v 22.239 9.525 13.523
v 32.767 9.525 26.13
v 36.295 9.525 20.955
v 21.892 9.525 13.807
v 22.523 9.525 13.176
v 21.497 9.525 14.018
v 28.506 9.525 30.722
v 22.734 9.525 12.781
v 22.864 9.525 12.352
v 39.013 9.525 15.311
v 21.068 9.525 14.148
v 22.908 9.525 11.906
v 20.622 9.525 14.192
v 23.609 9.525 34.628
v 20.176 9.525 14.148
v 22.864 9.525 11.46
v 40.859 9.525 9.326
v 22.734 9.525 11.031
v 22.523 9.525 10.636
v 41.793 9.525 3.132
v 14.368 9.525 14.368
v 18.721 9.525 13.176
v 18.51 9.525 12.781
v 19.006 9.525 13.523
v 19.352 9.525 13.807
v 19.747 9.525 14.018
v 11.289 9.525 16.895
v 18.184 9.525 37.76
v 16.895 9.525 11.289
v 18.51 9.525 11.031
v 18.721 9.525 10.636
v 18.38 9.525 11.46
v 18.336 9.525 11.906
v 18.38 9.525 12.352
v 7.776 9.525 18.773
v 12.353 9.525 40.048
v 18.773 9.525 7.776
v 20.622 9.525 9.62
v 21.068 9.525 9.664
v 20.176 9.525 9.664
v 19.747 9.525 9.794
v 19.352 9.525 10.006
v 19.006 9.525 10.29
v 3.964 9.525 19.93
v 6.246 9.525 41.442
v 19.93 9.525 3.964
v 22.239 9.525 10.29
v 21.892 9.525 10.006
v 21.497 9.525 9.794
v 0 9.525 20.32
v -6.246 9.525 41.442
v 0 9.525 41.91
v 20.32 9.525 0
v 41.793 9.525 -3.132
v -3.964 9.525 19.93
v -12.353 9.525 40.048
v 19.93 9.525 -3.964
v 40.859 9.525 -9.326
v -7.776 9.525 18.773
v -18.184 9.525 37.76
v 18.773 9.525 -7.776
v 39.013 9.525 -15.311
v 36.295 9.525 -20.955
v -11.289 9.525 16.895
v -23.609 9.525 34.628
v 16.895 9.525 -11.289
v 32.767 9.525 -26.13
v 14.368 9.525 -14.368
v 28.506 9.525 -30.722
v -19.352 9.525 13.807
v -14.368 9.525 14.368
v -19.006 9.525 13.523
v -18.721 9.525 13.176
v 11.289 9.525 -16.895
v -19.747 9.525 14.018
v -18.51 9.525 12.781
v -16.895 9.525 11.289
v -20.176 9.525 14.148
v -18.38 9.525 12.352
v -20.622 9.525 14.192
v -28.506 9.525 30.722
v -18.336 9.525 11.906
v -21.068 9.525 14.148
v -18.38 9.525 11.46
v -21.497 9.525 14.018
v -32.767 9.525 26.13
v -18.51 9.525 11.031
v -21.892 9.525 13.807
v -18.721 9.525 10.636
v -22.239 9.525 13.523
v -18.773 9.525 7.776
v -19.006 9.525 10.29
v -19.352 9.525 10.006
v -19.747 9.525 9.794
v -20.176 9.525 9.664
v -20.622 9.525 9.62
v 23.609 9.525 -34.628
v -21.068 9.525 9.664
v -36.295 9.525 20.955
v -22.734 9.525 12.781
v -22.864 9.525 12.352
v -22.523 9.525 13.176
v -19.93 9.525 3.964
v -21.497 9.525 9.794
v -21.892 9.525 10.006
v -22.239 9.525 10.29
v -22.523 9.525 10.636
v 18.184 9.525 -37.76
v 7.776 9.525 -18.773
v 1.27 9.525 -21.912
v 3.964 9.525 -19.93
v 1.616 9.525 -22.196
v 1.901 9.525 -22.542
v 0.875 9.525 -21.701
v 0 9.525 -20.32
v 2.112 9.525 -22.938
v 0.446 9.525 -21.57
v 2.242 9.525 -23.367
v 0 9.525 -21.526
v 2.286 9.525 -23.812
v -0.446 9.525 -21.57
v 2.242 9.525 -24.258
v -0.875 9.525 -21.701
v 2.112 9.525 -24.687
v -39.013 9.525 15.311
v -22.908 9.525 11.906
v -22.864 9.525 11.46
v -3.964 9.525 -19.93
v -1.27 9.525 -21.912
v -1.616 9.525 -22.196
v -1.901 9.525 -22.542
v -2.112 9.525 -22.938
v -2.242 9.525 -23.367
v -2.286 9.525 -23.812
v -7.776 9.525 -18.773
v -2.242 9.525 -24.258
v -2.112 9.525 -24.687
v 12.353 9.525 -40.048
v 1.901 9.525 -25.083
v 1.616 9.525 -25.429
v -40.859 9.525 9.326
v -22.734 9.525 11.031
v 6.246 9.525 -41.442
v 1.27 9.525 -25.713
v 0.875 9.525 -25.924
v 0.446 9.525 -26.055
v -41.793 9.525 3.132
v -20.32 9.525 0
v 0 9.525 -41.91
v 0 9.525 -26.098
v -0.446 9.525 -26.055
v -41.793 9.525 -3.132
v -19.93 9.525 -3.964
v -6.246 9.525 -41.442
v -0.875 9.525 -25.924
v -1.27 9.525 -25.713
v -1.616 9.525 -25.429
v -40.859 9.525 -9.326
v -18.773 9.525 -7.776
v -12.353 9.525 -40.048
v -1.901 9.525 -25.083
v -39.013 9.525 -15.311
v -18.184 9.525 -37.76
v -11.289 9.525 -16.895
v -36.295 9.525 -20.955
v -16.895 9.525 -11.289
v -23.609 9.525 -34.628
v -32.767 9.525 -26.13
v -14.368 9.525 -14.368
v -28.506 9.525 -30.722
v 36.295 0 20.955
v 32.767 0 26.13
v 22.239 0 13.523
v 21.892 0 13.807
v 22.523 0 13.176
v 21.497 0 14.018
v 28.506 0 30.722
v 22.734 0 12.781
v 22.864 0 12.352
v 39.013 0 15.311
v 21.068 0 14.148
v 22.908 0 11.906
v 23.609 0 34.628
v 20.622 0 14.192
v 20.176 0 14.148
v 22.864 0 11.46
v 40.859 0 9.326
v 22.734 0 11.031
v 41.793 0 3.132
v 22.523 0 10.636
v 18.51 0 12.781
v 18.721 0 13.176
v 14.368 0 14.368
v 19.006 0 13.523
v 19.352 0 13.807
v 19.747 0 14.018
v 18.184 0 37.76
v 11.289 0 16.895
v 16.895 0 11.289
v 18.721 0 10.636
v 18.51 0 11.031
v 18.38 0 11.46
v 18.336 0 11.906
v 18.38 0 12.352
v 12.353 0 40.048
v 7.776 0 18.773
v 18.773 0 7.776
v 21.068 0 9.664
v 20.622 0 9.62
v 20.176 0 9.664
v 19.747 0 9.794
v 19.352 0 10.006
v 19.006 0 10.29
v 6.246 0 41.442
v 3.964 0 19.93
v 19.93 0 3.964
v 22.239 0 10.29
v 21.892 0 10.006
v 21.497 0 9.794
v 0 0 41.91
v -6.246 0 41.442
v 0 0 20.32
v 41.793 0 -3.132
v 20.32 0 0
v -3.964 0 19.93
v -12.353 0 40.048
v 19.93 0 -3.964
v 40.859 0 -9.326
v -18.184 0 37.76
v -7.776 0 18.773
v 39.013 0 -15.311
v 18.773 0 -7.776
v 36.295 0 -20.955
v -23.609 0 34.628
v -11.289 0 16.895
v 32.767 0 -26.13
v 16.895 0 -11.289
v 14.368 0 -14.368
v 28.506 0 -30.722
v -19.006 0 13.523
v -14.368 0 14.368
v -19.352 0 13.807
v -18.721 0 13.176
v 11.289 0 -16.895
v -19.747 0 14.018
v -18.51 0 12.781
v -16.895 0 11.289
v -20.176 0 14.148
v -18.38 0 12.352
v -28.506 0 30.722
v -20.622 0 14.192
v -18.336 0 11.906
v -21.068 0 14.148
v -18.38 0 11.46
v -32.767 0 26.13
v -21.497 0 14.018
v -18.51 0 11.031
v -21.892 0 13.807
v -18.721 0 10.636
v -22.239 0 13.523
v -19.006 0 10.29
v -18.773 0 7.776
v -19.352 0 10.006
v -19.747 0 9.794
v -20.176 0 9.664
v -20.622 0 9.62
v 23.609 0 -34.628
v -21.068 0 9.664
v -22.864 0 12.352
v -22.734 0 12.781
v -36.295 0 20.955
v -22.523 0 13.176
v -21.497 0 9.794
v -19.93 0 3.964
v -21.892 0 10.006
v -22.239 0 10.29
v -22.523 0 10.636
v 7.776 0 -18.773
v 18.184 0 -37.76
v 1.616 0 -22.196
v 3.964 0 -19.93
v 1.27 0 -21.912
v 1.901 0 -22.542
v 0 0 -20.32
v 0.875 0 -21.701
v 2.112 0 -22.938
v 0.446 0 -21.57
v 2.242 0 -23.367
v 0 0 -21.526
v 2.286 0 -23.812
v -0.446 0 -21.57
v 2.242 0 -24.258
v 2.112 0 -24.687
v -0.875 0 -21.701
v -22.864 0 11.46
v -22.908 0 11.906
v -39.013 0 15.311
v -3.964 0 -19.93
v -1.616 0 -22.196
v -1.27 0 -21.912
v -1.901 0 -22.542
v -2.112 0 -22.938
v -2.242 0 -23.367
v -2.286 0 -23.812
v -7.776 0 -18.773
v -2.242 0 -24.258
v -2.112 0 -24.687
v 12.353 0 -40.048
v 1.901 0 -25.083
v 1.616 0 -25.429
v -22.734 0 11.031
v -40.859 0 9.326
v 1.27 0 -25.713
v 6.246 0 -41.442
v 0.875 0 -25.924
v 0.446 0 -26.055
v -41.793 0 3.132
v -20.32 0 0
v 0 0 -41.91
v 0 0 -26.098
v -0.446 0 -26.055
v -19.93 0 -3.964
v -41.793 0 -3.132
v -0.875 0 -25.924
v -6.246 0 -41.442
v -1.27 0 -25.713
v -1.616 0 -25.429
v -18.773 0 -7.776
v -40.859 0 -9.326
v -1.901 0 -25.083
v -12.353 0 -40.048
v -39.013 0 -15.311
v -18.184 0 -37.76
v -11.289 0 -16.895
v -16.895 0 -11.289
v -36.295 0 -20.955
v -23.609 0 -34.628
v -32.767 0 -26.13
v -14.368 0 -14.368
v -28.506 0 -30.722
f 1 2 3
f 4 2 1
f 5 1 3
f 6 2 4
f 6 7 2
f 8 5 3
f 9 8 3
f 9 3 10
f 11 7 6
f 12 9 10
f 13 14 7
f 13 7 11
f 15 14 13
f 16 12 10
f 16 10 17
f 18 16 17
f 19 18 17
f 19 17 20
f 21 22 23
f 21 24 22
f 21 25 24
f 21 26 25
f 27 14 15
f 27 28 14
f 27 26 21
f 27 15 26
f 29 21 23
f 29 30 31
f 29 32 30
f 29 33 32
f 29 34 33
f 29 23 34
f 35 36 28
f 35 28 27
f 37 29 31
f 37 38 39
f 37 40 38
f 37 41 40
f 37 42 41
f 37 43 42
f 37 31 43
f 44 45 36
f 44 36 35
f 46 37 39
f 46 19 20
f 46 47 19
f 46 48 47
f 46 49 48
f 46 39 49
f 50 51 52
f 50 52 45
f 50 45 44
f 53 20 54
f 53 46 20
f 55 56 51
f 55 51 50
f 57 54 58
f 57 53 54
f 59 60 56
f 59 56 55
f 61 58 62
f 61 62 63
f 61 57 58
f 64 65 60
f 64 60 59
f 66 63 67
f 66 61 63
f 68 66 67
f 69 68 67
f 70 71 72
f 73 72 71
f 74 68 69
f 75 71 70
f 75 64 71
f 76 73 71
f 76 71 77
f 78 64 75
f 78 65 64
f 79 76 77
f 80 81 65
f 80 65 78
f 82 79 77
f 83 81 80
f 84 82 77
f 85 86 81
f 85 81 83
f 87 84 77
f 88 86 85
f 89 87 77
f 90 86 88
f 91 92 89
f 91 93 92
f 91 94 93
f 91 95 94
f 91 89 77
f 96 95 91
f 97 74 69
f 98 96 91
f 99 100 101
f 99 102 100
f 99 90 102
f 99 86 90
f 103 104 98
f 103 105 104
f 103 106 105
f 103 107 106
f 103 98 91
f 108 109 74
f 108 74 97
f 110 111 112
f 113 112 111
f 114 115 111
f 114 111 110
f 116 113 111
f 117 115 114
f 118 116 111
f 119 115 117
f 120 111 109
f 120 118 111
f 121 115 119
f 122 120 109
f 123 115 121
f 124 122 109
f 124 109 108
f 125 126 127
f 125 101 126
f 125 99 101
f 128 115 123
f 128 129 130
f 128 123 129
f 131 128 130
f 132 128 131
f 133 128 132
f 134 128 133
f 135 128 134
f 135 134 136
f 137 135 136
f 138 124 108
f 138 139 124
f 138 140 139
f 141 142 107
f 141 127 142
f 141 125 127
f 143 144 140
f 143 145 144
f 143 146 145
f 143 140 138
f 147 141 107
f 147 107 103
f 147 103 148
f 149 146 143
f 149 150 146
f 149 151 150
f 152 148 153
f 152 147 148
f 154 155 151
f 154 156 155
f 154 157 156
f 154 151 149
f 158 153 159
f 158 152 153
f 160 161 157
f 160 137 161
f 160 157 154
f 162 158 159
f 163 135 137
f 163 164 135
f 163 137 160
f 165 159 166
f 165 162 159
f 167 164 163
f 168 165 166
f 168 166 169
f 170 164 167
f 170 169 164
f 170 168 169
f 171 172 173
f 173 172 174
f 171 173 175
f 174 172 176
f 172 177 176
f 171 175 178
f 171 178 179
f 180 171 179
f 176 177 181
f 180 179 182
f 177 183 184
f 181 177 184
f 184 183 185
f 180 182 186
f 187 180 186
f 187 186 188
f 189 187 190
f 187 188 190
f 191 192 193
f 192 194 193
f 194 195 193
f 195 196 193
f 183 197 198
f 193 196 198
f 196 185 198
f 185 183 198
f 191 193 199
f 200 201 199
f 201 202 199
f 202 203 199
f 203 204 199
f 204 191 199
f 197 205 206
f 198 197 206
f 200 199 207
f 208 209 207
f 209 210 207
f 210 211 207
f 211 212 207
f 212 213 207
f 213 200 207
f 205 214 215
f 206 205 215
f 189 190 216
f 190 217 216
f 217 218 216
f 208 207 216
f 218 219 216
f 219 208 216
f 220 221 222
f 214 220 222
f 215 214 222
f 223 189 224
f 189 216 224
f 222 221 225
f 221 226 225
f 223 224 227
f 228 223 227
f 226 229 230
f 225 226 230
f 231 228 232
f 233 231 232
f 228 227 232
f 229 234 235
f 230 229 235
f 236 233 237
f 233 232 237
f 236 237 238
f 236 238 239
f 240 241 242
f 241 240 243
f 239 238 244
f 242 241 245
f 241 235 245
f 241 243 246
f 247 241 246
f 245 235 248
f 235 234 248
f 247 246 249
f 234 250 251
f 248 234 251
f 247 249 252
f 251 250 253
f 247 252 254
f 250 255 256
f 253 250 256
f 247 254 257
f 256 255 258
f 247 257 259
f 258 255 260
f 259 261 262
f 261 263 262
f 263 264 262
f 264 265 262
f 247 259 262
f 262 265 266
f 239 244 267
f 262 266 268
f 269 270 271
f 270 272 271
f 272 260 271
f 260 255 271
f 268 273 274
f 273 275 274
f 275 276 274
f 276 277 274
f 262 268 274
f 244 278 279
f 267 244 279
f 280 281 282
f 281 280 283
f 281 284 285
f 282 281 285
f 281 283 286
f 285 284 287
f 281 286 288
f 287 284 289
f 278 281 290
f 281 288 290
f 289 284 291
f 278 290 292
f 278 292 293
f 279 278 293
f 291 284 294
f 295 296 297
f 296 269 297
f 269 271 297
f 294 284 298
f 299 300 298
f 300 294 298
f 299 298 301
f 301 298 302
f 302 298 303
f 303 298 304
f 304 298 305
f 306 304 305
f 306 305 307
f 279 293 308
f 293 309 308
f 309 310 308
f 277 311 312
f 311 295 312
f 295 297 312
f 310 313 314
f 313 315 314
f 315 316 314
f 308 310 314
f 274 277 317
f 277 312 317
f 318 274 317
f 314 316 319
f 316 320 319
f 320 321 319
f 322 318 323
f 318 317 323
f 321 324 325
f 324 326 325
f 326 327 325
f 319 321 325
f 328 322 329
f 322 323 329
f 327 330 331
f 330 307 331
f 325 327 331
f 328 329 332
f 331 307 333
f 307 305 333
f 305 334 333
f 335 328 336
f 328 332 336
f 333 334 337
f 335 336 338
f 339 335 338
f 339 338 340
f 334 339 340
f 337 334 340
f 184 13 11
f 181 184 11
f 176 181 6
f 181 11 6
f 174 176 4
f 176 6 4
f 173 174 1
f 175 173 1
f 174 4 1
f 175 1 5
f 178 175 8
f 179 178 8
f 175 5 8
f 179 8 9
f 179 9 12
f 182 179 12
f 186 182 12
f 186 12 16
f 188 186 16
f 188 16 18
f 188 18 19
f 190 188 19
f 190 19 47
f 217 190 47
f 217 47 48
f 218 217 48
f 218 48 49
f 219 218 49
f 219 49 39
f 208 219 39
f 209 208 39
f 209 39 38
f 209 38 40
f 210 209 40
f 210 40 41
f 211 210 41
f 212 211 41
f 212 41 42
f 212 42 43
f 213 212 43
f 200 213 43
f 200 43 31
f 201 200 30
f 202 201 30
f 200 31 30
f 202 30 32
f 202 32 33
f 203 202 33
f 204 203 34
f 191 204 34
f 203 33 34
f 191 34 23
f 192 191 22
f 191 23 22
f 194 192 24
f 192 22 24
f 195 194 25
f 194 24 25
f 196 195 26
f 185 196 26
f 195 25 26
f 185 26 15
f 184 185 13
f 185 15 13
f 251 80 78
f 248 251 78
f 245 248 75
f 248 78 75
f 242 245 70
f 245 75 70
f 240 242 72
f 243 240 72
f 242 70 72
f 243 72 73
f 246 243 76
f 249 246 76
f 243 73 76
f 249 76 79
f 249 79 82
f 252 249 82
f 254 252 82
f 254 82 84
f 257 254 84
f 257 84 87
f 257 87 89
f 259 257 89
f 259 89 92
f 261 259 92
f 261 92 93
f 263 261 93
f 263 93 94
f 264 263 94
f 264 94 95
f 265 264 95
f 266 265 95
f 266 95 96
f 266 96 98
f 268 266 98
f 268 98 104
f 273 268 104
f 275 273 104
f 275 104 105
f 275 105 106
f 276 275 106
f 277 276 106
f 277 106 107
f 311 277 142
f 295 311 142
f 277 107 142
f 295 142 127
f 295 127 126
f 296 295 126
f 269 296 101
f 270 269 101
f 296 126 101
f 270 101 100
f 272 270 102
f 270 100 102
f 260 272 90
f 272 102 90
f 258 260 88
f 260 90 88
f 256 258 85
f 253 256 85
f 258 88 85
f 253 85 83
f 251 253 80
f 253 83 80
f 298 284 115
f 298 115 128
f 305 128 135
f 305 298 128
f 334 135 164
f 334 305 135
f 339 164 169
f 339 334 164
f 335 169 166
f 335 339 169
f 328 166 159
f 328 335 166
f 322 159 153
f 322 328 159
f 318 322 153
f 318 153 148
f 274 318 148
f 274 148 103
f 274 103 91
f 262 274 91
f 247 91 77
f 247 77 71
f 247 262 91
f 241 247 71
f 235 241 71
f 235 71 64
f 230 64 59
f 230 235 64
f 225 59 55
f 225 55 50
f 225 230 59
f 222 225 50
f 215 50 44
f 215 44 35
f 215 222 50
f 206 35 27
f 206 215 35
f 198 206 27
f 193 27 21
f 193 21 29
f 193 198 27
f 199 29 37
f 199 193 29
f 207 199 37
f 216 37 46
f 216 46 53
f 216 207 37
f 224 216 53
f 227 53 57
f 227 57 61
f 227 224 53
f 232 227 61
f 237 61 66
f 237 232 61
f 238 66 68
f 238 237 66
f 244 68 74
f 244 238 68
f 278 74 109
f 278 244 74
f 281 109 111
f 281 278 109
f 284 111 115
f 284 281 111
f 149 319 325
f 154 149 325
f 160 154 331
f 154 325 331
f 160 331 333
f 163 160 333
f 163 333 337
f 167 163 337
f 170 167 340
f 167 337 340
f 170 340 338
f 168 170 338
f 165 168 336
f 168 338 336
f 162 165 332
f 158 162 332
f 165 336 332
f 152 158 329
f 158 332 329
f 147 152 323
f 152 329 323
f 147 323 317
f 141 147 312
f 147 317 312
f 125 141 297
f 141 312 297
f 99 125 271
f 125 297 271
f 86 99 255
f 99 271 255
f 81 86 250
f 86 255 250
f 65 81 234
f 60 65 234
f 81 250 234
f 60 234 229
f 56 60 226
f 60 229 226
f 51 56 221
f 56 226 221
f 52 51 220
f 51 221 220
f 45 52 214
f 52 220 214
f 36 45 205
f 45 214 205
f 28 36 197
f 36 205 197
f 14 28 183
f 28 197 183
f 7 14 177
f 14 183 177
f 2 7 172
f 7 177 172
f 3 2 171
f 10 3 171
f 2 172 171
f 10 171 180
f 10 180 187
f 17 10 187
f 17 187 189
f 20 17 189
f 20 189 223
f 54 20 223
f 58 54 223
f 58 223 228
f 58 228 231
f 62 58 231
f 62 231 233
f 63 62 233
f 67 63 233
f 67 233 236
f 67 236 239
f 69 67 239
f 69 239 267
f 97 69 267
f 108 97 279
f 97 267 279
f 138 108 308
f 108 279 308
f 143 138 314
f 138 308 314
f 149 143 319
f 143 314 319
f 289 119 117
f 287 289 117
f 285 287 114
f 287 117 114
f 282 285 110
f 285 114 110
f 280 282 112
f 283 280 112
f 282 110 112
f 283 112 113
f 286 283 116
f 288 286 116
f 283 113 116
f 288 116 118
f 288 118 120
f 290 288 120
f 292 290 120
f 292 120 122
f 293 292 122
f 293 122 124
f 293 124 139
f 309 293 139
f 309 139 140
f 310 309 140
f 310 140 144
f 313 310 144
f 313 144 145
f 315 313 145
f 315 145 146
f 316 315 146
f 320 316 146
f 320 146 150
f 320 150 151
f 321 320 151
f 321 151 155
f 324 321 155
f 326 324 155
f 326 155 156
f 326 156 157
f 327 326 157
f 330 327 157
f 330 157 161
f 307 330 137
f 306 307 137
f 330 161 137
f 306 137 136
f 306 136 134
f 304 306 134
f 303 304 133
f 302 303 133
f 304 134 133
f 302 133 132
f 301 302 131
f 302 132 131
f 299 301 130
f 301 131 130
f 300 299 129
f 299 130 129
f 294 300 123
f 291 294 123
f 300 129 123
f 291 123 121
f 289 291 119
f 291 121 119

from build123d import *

# Parameters (mm, degrees)
SKETCH1_R           = 41.91
SKETCH1_R_2         = 20.32
BOSS_EXTRUDE1_DEPTH = 9.525
SKETCH2_R           = 2.286
CUT_EXTRUDE1_DEPTH  = 61.030174288


with BuildPart() as part:
    # Sketch1 → Boss-Extrude1 (new body)
    with BuildSketch(Plane(origin=(0, 0, 0), x_dir=(1, 0, 0), z_dir=(0, 1, 0))):
        with Locations(Location((0, 0, 0), (0, 0, 90))):
            Circle(SKETCH1_R)
        with Locations(Location((0, 0, 0), (0, 0, 90))):
            Circle(SKETCH1_R_2, mode=Mode.SUBTRACT)
    extrude(amount=BOSS_EXTRUDE1_DEPTH)

    # Sketch2 → Cut-Extrude1 (cut, through all)
    with BuildSketch(Plane(origin=(0, 9.525, 0), x_dir=(1, 0, 0), z_dir=(0, 1, 0))):
        with Locations(Location((0, 23.8125, 0), (0, 0, 270))):
            Circle(SKETCH2_R)
        with Locations(Location((20.622229928, -11.90625, 0), (0, 0, 270))):
            Circle(SKETCH2_R)
        with Locations(Location((-20.622229928, -11.90625, 0), (0, 0, 270))):
            Circle(SKETCH2_R)
    extrude(amount=-CUT_EXTRUDE1_DEPTH, mode=Mode.SUBTRACT)


solid = part.part
